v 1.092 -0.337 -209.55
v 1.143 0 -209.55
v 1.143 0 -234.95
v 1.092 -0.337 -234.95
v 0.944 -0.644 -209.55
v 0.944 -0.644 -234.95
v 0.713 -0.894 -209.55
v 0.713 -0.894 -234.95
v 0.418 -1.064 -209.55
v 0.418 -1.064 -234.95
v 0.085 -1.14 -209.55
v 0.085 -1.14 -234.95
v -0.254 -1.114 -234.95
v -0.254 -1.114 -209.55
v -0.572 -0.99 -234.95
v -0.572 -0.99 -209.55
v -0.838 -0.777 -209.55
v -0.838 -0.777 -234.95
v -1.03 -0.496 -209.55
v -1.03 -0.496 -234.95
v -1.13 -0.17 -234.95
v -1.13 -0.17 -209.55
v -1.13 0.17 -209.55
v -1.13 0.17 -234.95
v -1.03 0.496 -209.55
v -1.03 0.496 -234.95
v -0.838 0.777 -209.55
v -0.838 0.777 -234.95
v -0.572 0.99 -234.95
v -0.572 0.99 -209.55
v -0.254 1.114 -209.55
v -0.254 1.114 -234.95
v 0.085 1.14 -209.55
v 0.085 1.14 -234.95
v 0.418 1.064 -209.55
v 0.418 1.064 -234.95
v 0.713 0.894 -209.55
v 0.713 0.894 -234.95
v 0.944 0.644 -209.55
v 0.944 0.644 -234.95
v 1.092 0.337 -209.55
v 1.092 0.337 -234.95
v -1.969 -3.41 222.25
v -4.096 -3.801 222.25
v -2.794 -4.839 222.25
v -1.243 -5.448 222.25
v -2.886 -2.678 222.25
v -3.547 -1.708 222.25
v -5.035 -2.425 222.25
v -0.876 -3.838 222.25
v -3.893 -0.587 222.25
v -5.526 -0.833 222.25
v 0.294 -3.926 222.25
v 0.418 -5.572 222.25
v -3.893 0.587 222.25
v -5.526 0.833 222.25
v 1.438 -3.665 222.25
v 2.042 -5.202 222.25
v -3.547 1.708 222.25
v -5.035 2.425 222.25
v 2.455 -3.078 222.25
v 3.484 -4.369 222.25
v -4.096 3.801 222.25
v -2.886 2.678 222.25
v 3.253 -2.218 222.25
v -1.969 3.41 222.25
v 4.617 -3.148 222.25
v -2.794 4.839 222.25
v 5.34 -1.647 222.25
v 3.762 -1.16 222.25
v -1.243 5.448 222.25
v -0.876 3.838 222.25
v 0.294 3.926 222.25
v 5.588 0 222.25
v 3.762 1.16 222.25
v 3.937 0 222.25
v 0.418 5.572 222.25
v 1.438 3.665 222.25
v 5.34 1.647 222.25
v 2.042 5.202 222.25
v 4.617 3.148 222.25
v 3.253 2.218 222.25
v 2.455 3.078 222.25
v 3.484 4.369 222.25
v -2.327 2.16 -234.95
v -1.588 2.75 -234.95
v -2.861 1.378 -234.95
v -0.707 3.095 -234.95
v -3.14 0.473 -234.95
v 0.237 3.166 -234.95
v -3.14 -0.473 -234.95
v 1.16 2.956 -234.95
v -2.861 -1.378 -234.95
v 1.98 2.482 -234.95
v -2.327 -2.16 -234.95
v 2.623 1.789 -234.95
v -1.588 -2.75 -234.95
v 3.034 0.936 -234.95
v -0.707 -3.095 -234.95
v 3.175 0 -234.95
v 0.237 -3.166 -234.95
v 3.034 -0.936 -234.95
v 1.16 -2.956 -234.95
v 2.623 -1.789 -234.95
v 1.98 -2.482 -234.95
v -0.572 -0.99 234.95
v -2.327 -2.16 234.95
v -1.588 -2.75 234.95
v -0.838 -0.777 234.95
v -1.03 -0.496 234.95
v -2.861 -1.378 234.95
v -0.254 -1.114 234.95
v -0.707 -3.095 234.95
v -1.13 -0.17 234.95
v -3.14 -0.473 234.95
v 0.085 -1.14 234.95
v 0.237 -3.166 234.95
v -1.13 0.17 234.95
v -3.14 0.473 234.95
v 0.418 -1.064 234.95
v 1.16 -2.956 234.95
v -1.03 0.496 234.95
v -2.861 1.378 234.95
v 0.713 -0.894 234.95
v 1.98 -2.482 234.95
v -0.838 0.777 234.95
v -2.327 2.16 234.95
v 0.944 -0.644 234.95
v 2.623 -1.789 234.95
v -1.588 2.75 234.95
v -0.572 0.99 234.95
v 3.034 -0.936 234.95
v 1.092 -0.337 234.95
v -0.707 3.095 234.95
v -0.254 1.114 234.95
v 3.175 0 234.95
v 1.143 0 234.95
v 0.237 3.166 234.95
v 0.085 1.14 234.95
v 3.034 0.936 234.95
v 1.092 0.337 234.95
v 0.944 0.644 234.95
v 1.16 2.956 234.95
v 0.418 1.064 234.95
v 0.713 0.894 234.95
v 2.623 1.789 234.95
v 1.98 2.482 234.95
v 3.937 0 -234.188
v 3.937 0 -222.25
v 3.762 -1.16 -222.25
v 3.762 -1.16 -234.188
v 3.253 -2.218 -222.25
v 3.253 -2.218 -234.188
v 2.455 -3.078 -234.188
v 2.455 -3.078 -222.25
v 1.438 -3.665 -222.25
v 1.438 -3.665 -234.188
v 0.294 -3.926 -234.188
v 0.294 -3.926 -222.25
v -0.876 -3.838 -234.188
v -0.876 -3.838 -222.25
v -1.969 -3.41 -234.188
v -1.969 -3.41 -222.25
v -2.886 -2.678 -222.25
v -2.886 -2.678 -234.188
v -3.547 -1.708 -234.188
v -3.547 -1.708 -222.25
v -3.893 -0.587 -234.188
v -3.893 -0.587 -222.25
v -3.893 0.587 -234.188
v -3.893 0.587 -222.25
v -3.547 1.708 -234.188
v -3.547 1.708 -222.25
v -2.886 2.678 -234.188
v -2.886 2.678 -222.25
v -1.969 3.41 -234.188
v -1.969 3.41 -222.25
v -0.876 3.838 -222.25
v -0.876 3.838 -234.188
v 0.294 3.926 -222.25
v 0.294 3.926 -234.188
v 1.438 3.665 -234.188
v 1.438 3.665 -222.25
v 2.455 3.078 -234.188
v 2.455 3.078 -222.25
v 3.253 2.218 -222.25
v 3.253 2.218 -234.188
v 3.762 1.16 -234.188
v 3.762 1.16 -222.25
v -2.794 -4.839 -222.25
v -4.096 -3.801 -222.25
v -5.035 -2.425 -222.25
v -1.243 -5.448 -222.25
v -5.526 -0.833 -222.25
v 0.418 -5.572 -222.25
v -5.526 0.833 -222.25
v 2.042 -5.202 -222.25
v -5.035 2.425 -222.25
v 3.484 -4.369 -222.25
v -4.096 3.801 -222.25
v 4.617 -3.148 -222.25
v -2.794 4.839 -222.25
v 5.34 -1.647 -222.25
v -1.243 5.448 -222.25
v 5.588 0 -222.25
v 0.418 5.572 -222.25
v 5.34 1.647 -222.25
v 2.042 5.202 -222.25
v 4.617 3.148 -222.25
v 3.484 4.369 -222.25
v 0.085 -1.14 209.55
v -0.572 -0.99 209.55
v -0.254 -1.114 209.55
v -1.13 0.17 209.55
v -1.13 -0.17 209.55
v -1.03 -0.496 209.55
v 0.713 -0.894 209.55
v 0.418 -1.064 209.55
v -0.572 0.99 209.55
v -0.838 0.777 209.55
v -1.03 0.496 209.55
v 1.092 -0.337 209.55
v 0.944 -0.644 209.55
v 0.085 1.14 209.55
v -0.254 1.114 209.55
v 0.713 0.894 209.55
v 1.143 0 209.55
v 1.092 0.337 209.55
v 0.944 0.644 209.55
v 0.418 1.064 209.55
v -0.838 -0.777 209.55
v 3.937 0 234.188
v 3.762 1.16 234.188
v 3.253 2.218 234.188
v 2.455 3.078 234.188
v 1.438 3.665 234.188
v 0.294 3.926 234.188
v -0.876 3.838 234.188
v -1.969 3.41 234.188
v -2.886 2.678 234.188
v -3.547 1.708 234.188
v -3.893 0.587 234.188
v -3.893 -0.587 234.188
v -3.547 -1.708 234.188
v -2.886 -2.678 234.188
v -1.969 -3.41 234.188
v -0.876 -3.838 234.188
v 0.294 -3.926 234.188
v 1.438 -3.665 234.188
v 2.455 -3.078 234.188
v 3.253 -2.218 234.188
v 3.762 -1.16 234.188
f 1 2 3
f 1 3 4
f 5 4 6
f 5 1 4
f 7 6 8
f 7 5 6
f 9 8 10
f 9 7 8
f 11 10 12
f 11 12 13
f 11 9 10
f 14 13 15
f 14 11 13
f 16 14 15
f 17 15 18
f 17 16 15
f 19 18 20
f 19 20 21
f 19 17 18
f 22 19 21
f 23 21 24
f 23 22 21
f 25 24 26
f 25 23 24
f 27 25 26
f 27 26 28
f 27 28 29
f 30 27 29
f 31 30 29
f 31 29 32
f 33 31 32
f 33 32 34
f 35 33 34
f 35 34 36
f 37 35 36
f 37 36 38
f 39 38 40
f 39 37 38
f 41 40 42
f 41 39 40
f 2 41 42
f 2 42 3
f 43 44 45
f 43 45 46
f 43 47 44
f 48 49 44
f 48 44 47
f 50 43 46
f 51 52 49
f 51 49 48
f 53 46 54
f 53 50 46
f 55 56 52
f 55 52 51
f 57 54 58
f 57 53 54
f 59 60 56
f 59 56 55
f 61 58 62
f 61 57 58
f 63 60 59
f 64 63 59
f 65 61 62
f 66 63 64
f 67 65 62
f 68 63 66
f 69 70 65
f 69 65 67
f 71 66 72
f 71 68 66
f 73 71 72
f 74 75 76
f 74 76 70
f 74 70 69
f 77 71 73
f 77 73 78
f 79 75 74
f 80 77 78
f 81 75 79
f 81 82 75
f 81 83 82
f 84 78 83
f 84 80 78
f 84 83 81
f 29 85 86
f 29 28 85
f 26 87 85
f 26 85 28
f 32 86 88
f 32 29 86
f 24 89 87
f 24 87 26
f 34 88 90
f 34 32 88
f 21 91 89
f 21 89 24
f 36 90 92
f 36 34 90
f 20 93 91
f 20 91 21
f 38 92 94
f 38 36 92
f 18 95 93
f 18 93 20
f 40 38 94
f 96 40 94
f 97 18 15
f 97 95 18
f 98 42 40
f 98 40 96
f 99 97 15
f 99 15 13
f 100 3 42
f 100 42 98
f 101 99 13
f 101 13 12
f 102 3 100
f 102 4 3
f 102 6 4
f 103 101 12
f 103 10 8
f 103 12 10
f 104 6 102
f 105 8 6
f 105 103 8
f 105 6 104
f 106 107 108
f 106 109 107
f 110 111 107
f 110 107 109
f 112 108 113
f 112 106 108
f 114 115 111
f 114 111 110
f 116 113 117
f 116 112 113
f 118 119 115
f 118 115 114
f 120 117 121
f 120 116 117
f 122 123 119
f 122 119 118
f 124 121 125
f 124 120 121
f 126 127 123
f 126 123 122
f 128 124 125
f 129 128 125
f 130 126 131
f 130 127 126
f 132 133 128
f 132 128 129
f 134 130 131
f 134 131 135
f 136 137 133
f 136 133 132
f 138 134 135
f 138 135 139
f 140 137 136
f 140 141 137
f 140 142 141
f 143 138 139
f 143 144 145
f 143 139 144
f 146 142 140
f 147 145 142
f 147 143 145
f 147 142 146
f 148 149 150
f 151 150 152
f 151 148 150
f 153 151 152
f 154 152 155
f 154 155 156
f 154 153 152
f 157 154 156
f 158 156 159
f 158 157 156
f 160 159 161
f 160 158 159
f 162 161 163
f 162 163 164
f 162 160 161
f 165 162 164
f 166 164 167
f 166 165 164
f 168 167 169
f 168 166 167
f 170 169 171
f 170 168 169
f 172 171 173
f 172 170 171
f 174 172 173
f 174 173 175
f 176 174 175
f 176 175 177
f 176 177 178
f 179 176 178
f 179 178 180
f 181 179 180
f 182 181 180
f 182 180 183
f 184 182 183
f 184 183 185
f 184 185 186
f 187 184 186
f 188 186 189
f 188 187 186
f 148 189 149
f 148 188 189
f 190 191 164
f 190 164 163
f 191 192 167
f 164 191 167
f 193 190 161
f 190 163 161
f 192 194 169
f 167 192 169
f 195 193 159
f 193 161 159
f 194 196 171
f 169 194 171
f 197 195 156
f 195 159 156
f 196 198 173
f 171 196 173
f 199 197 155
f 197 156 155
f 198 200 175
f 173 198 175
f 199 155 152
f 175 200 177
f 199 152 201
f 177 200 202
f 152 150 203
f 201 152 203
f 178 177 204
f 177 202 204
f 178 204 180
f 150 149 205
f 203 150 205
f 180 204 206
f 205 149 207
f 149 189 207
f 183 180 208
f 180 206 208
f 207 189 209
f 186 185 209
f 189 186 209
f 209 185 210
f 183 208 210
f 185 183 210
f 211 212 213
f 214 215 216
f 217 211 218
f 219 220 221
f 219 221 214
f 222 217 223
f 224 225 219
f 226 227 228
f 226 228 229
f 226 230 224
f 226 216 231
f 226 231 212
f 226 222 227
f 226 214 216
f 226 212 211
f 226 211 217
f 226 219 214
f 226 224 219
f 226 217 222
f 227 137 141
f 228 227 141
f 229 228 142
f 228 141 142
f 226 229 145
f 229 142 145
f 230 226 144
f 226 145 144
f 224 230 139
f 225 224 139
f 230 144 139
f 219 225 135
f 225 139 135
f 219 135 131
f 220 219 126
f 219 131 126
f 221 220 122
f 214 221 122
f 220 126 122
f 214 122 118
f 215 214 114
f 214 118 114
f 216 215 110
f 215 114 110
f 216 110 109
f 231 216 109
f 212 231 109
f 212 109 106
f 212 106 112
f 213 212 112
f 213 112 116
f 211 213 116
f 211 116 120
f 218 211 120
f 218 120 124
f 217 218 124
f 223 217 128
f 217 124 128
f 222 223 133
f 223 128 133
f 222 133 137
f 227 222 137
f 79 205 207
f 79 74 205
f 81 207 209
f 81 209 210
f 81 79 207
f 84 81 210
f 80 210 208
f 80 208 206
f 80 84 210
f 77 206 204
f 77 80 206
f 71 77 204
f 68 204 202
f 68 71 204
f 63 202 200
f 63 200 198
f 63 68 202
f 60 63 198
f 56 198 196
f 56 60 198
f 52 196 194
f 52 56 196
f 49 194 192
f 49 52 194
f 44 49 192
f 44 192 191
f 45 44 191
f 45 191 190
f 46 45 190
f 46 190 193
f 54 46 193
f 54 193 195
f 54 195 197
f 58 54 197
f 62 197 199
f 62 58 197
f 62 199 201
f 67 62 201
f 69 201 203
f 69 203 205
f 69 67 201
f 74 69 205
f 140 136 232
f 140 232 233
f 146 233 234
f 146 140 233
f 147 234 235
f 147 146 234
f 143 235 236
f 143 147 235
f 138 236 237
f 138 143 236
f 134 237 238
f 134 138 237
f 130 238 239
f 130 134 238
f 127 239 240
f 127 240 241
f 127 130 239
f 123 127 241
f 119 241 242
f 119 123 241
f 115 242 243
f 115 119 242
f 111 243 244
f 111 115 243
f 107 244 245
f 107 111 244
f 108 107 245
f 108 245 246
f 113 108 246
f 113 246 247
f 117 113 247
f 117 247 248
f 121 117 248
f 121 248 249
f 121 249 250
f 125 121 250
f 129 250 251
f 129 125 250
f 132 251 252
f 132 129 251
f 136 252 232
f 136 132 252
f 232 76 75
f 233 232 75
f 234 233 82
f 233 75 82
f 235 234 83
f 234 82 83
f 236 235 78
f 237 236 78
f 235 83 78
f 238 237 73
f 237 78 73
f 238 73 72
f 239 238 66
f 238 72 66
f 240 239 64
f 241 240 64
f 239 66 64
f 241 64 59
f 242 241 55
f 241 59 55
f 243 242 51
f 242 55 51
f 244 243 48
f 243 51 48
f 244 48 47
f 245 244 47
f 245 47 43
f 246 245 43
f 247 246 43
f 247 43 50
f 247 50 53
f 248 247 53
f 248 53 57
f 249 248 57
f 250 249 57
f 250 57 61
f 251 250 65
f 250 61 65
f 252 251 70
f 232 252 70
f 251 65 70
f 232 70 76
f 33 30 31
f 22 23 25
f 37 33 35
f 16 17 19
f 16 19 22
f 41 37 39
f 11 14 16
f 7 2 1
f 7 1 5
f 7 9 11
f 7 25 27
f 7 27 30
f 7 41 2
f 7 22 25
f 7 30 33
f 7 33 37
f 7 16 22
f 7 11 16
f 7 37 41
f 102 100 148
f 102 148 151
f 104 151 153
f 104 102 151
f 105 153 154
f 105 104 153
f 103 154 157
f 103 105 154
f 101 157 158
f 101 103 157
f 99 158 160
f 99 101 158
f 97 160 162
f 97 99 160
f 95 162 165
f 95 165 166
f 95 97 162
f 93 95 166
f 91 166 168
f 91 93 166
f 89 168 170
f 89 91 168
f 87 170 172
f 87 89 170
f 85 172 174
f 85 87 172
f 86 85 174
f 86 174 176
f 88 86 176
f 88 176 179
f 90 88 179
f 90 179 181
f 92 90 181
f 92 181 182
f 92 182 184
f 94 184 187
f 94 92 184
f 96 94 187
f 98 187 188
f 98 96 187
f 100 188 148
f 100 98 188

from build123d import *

# Parameters (mm, degrees)
SKETCH2_R           = 5.588
BOSS_EXTRUDE1_DEPTH = 222.25
SKETCH3_R           = 3.937
BOSS_EXTRUDE2_DEPTH = 12.7
BOSS_EXTRUDE3_START = 12.7
SKETCH4_R           = 3.937
BOSS_EXTRUDE3_DEPTH = 12.7
SKETCH5_R           = 1.143
CUT_EXTRUDE1_DEPTH  = 25.4
CUT_EXTRUDE2_START  = -25.4
SKETCH6_R           = 1.143
CUT_EXTRUDE2_DEPTH  = 25.4
CHAMFER2_SIZE       = 0.762


with BuildPart() as part:
    # Sketch2 → Boss-Extrude1 (new, symmetric)
    with BuildSketch(Plane.XY):
        Circle(SKETCH2_R)
    extrude(amount=BOSS_EXTRUDE1_DEPTH, both=True)

    # Sketch3 → Boss-Extrude2 (add)
    with BuildSketch(Plane.XY.offset(222.25)):
        Circle(SKETCH3_R)
    extrude(amount=BOSS_EXTRUDE2_DEPTH)

    # Sketch4 → Boss-Extrude3 (add)
    with BuildSketch(Plane(origin=(0, 0, -222.25), x_dir=(-1, 0, 0), z_dir=(0, 0, -1)).offset(BOSS_EXTRUDE3_START)):
        with Locations(Location((0, 0, 0), (0, 0, 180))):
            Circle(SKETCH4_R)
    extrude(amount=-BOSS_EXTRUDE3_DEPTH)

    # Sketch5 → Cut-Extrude1 (cut)
    with BuildSketch(Plane.XY.offset(234.95)):
        Circle(SKETCH5_R)
    extrude(amount=-CUT_EXTRUDE1_DEPTH, mode=Mode.SUBTRACT)

    # Sketch6 → Cut-Extrude2 (cut)
    with BuildSketch(Plane(origin=(0, 0, -234.95), x_dir=(-1, 0, 0), z_dir=(0, 0, -1)).offset(CUT_EXTRUDE2_START)):
        with Locations(Location((0, 0, 0), (0, 0, 180))):
            Circle(SKETCH6_R)
    extrude(amount=CUT_EXTRUDE2_DEPTH, mode=Mode.SUBTRACT)

    # Chamfer2
    chamfer2_edges = [part.edges().sort_by_distance(p)[0] for p in [
        (-3.937, 0, -234.95),
        (-3.937, 0, 234.95),
    ]]
    chamfer(chamfer2_edges, length=CHAMFER2_SIZE)


solid = part.part
